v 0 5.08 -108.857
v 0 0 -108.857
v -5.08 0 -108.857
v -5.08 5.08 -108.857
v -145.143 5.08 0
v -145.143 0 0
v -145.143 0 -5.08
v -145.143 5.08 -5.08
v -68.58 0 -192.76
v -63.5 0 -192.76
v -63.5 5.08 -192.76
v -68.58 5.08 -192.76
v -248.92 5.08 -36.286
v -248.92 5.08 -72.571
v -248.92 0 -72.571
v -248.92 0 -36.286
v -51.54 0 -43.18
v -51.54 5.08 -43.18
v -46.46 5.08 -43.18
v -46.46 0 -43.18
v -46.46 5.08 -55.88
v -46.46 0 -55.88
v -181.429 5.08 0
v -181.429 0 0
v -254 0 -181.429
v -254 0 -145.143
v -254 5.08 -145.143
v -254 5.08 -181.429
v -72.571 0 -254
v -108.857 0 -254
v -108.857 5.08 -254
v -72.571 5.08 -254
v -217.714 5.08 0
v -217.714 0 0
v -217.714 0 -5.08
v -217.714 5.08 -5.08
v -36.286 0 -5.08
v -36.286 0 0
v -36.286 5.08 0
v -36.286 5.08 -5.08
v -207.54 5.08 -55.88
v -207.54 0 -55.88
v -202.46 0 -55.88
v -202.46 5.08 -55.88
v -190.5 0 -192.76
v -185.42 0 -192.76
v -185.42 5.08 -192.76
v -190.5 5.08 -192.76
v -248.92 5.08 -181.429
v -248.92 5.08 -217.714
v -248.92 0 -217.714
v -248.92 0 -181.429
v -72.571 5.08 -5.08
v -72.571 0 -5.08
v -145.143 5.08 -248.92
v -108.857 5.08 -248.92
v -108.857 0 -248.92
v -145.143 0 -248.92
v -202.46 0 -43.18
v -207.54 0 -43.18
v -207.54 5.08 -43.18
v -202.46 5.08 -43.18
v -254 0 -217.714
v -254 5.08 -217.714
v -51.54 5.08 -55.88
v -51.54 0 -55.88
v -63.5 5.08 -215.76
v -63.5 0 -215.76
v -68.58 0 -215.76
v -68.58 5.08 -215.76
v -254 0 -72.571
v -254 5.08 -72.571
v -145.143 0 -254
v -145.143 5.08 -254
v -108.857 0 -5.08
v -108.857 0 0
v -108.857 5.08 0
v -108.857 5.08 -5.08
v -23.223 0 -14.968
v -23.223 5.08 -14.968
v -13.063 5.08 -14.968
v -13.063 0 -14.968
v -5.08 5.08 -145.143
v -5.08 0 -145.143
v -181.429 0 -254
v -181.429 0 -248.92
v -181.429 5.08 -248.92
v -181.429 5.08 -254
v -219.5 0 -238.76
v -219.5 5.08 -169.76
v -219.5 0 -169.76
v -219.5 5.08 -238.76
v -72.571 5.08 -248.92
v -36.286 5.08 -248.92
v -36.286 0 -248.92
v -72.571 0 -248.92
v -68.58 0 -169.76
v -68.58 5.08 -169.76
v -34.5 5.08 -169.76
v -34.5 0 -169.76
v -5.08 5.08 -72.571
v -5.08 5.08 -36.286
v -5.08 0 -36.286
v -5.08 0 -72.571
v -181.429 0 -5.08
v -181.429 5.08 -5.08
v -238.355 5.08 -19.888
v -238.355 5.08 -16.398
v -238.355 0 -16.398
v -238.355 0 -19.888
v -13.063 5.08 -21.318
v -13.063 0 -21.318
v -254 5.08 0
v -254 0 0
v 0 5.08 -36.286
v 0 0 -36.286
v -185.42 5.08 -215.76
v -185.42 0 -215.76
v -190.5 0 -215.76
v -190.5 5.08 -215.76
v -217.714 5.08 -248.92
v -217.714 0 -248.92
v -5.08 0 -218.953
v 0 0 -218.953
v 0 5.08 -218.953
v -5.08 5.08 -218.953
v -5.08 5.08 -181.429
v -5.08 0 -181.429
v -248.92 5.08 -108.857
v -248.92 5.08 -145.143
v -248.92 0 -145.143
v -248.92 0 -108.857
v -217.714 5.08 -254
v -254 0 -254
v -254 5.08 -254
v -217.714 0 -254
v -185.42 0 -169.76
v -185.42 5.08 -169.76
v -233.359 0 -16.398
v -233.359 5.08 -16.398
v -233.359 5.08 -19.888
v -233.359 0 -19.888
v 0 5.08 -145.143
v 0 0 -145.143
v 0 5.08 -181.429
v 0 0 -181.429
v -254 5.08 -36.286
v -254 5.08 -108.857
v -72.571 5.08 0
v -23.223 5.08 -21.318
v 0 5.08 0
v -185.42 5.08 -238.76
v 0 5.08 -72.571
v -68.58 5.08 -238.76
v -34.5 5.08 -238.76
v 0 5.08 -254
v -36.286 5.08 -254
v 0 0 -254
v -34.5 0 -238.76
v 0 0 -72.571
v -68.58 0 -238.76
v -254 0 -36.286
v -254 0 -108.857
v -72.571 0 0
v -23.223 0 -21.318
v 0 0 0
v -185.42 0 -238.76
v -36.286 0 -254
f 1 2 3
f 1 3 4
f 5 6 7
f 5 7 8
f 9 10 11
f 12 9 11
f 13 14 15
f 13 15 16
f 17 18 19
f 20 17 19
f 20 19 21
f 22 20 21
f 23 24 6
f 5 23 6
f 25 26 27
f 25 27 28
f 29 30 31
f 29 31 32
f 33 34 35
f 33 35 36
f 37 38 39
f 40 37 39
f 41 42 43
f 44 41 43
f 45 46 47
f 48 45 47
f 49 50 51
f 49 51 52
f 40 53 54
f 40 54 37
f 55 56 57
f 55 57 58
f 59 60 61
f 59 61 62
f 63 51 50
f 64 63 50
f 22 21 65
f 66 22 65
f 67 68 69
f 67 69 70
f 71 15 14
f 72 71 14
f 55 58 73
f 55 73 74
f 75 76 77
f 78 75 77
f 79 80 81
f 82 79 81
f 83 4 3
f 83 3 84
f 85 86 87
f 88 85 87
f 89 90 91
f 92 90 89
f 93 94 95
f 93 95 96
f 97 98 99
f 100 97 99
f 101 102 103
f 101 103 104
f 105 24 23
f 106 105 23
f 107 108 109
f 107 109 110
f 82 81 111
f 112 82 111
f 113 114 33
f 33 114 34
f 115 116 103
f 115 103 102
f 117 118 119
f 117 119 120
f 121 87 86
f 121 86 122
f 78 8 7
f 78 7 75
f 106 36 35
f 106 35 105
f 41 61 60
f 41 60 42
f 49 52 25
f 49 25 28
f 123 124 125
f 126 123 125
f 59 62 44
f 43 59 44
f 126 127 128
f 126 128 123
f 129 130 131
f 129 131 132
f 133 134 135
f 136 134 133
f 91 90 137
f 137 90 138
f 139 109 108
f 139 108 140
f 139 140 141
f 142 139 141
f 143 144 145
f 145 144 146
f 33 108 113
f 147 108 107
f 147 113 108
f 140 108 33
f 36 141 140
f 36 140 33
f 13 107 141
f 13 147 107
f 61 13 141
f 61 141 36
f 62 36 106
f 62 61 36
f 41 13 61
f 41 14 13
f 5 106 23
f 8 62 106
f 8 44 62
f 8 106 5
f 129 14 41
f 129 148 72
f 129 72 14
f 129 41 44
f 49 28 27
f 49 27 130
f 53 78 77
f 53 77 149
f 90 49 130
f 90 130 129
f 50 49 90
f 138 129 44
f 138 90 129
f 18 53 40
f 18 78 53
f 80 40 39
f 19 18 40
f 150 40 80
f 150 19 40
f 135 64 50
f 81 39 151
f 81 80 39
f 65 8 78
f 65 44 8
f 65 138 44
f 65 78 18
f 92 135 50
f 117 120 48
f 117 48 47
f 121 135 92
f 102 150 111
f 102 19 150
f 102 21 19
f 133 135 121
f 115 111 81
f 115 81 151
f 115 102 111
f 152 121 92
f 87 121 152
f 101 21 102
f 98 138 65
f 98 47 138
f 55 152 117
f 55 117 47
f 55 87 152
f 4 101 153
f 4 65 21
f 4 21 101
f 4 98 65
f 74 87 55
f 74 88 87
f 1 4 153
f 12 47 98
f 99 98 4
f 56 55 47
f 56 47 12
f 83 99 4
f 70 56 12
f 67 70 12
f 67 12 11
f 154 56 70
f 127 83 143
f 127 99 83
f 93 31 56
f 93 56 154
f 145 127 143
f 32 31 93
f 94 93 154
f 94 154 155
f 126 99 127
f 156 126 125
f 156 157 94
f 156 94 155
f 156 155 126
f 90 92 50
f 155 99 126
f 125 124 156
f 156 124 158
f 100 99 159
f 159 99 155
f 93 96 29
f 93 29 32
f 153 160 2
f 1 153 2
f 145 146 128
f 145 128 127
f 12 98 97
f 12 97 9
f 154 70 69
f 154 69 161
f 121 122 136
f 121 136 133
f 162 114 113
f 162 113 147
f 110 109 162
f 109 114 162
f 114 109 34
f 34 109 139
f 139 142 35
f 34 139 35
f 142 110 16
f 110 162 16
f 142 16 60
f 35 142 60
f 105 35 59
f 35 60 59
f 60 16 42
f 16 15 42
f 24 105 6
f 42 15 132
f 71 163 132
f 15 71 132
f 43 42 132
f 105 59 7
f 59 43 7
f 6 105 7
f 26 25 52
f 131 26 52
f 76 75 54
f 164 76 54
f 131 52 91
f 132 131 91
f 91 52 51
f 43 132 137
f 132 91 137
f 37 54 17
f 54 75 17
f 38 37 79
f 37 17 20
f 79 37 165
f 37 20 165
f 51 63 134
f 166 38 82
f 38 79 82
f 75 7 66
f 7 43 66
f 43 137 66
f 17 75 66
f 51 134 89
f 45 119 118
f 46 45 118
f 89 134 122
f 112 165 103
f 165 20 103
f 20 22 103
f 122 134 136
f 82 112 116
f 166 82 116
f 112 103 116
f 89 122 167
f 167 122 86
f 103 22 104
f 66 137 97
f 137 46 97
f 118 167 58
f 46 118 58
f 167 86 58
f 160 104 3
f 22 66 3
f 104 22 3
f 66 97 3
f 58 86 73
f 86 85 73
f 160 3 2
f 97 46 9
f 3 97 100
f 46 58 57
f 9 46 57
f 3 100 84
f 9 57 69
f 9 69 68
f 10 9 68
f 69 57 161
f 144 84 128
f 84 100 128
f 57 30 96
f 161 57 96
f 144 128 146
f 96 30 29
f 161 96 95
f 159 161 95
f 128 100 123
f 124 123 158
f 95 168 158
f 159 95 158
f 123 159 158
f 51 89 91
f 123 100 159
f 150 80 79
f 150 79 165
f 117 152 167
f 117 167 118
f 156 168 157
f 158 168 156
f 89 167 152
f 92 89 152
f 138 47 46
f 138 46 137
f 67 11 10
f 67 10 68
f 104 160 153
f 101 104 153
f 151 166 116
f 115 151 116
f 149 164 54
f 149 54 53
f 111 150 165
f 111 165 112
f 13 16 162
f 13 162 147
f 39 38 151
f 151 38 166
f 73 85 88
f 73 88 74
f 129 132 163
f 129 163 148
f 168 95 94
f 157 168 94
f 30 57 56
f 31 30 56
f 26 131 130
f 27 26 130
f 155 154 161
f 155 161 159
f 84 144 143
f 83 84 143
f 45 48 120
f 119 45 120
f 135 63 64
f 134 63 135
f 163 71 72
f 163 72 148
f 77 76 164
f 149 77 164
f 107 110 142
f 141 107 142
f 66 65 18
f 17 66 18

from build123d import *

# Parameters (mm, degrees)
SKETCH1_W           = 254
SKETCH1_H           = 254
BOSS_EXTRUDE1_DEPTH = 5.08
SKETCH2_W           = 36.285714285
SKETCH2_H           = 5.08
SKETCH2_W_2         = 36.285714286
CUT_EXTRUDE1_DEPTH  = 5.08
SKETCH3_W           = 36.285714285
SKETCH3_H           = 5.08
SKETCH3_W_2         = 36.285714286
SKETCH3_W_3         = 37.524307816
CUT_EXTRUDE2_DEPTH  = 5.08
SKETCH4_W           = 36.285714285
SKETCH4_H           = 5.08
SKETCH4_W_2         = 36.285714286
CUT_EXTRUDE3_DEPTH  = 5.08
SKETCH5_W           = 36.285714285
SKETCH5_H           = 5.08
SKETCH5_W_2         = 36.285714286
CUT_EXTRUDE4_DEPTH  = 5.08
SKETCH6_W           = 29
SKETCH6_H           = 69
CUT_EXTRUDE5_DEPTH  = 5.08
CUT_EXTRUDE6_DEPTH  = 5.08
SKETCH8_W           = 5.08
SKETCH8_H           = 12.7
CUT_EXTRUDE7_DEPTH  = 5.08
SKETCH9_W           = 23
SKETCH9_H           = 5.08
CUT_EXTRUDE8_DEPTH  = 5.08
SKETCH10_W          = 23
SKETCH10_H          = 5.08
CUT_EXTRUDE9_DEPTH  = 5.08
SKETCH11_W          = 10.16
SKETCH11_H          = 6.35
CUT_EXTRUDE10_DEPTH = 5.08
SKETCH12_W          = 4.99581634
SKETCH12_H          = 3.489472518
CUT_EXTRUDE11_DEPTH = 5.08


with BuildPart() as part:
    # Sketch1 → Boss-Extrude1 (new body)
    with BuildSketch(Plane(origin=(0, 0, 0), x_dir=(1, 0, 0), z_dir=(0, 1, 0))):
        with Locations((-127, 127)):
            Rectangle(SKETCH1_W, SKETCH1_H)
    extrude(amount=BOSS_EXTRUDE1_DEPTH)

    # Sketch2 → Cut-Extrude1 (cut)
    with BuildSketch(Plane.XY):
        with Locations((-199.571428572, 2.54)):
            Rectangle(SKETCH2_W, SKETCH2_H)
        with Locations((-127, 2.54)):
            Rectangle(SKETCH2_W_2, SKETCH2_H)
        with Locations((-54.428571428, 2.54)):
            Rectangle(SKETCH2_W, SKETCH2_H)
    extrude(amount=-CUT_EXTRUDE1_DEPTH, mode=Mode.SUBTRACT)

    # Sketch3 → Cut-Extrude2 (cut)
    with BuildSketch(Plane(origin=(0, 0, 0), x_dir=(0, 0, -1), z_dir=(1, 0, 0))):
        with Locations((54.428571428, 2.54)):
            Rectangle(SKETCH3_W, SKETCH3_H)
        with Locations((127, 2.54)):
            Rectangle(SKETCH3_W_2, SKETCH3_H)
        with Locations((200.190725337, 2.54)):
            Rectangle(SKETCH3_W_3, SKETCH3_H)
    extrude(amount=-CUT_EXTRUDE2_DEPTH, mode=Mode.SUBTRACT)

    # Sketch4 → Cut-Extrude3 (cut)
    with BuildSketch(Plane(origin=(0, 0, -254), x_dir=(-1, 0, 0), z_dir=(0, 0, -1))):
        with Locations((54.428571428, 2.54)):
            Rectangle(SKETCH4_W, SKETCH4_H)
        with Locations((127, 2.54)):
            Rectangle(SKETCH4_W_2, SKETCH4_H)
        with Locations((199.571428572, 2.54)):
            Rectangle(SKETCH4_W, SKETCH4_H)
    extrude(amount=-CUT_EXTRUDE3_DEPTH, mode=Mode.SUBTRACT)

    # Sketch5 → Cut-Extrude4 (cut)
    with BuildSketch(Plane.ZY.offset(254)):
        with Locations((-199.571428572, 2.54)):
            Rectangle(SKETCH5_W, SKETCH5_H)
        with Locations((-127, 2.54)):
            Rectangle(SKETCH5_W_2, SKETCH5_H)
        with Locations((-54.428571428, 2.54)):
            Rectangle(SKETCH5_W, SKETCH5_H)
    extrude(amount=-CUT_EXTRUDE4_DEPTH, mode=Mode.SUBTRACT)

    # Sketch6 → Cut-Extrude5 (cut)
    with BuildSketch(Plane(origin=(0, 5.08, 0), x_dir=(1, 0, 0), z_dir=(0, 1, 0))):
        with Locations((-49, 204.26)):
            Rectangle(SKETCH6_W, SKETCH6_H)
        with Locations((-205, 204.26)):
            Rectangle(SKETCH6_W, SKETCH6_H)
    extrude(amount=-CUT_EXTRUDE5_DEPTH, mode=Mode.SUBTRACT)

    # Sketch7 → Cut-Extrude6 (cut)
    with BuildSketch(Plane(origin=(0, 5.08, 0), x_dir=(1, 0, 0), z_dir=(0, 1, 0))):
        Polygon((-51.54, 43.18), (-49, 43.18), (-46.46, 43.18), (-46.46, 55.88), (-51.54, 55.88), align=None)
    extrude(amount=-CUT_EXTRUDE6_DEPTH, mode=Mode.SUBTRACT)

    # Sketch8 → Cut-Extrude7 (cut)
    with BuildSketch(Plane(origin=(0, 5.08, 0), x_dir=(1, 0, 0), z_dir=(0, 1, 0))):
        with Locations((-205, 49.53)):
            Rectangle(SKETCH8_W, SKETCH8_H)
    extrude(amount=-CUT_EXTRUDE7_DEPTH, mode=Mode.SUBTRACT)

    # Sketch9 → Cut-Extrude8 (cut)
    with BuildSketch(Plane(origin=(-63.5, 0, 0), x_dir=(0, 0, -1), z_dir=(1, 0, 0))):
        with Locations((181.26, 2.54)):
            Rectangle(SKETCH9_W, SKETCH9_H)
        with Locations((227.26, 2.54)):
            Rectangle(SKETCH9_W, SKETCH9_H)
    extrude(amount=-CUT_EXTRUDE8_DEPTH, mode=Mode.SUBTRACT)

    # Sketch10 → Cut-Extrude9 (cut)
    with BuildSketch(Plane.ZY.offset(190.5)):
        with Locations((-181.26, 2.54)):
            Rectangle(SKETCH10_W, SKETCH10_H)
        with Locations((-227.26, 2.54)):
            Rectangle(SKETCH10_W, SKETCH10_H)
    extrude(amount=-CUT_EXTRUDE9_DEPTH, mode=Mode.SUBTRACT)

    # Sketch11 → Cut-Extrude10 (cut)
    with BuildSketch(Plane(origin=(0, 5.08, 0), x_dir=(1, 0, 0), z_dir=(0, 1, 0))):
        with Locations((-18.142857143, 18.142857143)):
            Rectangle(SKETCH11_W, SKETCH11_H)
    extrude(amount=-CUT_EXTRUDE10_DEPTH, mode=Mode.SUBTRACT)

    # Sketch12 → Cut-Extrude11 (cut)
    with BuildSketch(Plane(origin=(0, 5.08, 0), x_dir=(1, 0, 0), z_dir=(0, 1, 0))):
        with Locations((-235.857142857, 18.142857143)):
            Rectangle(SKETCH12_W, SKETCH12_H)
    extrude(amount=-CUT_EXTRUDE11_DEPTH, mode=Mode.SUBTRACT)


solid = part.part
